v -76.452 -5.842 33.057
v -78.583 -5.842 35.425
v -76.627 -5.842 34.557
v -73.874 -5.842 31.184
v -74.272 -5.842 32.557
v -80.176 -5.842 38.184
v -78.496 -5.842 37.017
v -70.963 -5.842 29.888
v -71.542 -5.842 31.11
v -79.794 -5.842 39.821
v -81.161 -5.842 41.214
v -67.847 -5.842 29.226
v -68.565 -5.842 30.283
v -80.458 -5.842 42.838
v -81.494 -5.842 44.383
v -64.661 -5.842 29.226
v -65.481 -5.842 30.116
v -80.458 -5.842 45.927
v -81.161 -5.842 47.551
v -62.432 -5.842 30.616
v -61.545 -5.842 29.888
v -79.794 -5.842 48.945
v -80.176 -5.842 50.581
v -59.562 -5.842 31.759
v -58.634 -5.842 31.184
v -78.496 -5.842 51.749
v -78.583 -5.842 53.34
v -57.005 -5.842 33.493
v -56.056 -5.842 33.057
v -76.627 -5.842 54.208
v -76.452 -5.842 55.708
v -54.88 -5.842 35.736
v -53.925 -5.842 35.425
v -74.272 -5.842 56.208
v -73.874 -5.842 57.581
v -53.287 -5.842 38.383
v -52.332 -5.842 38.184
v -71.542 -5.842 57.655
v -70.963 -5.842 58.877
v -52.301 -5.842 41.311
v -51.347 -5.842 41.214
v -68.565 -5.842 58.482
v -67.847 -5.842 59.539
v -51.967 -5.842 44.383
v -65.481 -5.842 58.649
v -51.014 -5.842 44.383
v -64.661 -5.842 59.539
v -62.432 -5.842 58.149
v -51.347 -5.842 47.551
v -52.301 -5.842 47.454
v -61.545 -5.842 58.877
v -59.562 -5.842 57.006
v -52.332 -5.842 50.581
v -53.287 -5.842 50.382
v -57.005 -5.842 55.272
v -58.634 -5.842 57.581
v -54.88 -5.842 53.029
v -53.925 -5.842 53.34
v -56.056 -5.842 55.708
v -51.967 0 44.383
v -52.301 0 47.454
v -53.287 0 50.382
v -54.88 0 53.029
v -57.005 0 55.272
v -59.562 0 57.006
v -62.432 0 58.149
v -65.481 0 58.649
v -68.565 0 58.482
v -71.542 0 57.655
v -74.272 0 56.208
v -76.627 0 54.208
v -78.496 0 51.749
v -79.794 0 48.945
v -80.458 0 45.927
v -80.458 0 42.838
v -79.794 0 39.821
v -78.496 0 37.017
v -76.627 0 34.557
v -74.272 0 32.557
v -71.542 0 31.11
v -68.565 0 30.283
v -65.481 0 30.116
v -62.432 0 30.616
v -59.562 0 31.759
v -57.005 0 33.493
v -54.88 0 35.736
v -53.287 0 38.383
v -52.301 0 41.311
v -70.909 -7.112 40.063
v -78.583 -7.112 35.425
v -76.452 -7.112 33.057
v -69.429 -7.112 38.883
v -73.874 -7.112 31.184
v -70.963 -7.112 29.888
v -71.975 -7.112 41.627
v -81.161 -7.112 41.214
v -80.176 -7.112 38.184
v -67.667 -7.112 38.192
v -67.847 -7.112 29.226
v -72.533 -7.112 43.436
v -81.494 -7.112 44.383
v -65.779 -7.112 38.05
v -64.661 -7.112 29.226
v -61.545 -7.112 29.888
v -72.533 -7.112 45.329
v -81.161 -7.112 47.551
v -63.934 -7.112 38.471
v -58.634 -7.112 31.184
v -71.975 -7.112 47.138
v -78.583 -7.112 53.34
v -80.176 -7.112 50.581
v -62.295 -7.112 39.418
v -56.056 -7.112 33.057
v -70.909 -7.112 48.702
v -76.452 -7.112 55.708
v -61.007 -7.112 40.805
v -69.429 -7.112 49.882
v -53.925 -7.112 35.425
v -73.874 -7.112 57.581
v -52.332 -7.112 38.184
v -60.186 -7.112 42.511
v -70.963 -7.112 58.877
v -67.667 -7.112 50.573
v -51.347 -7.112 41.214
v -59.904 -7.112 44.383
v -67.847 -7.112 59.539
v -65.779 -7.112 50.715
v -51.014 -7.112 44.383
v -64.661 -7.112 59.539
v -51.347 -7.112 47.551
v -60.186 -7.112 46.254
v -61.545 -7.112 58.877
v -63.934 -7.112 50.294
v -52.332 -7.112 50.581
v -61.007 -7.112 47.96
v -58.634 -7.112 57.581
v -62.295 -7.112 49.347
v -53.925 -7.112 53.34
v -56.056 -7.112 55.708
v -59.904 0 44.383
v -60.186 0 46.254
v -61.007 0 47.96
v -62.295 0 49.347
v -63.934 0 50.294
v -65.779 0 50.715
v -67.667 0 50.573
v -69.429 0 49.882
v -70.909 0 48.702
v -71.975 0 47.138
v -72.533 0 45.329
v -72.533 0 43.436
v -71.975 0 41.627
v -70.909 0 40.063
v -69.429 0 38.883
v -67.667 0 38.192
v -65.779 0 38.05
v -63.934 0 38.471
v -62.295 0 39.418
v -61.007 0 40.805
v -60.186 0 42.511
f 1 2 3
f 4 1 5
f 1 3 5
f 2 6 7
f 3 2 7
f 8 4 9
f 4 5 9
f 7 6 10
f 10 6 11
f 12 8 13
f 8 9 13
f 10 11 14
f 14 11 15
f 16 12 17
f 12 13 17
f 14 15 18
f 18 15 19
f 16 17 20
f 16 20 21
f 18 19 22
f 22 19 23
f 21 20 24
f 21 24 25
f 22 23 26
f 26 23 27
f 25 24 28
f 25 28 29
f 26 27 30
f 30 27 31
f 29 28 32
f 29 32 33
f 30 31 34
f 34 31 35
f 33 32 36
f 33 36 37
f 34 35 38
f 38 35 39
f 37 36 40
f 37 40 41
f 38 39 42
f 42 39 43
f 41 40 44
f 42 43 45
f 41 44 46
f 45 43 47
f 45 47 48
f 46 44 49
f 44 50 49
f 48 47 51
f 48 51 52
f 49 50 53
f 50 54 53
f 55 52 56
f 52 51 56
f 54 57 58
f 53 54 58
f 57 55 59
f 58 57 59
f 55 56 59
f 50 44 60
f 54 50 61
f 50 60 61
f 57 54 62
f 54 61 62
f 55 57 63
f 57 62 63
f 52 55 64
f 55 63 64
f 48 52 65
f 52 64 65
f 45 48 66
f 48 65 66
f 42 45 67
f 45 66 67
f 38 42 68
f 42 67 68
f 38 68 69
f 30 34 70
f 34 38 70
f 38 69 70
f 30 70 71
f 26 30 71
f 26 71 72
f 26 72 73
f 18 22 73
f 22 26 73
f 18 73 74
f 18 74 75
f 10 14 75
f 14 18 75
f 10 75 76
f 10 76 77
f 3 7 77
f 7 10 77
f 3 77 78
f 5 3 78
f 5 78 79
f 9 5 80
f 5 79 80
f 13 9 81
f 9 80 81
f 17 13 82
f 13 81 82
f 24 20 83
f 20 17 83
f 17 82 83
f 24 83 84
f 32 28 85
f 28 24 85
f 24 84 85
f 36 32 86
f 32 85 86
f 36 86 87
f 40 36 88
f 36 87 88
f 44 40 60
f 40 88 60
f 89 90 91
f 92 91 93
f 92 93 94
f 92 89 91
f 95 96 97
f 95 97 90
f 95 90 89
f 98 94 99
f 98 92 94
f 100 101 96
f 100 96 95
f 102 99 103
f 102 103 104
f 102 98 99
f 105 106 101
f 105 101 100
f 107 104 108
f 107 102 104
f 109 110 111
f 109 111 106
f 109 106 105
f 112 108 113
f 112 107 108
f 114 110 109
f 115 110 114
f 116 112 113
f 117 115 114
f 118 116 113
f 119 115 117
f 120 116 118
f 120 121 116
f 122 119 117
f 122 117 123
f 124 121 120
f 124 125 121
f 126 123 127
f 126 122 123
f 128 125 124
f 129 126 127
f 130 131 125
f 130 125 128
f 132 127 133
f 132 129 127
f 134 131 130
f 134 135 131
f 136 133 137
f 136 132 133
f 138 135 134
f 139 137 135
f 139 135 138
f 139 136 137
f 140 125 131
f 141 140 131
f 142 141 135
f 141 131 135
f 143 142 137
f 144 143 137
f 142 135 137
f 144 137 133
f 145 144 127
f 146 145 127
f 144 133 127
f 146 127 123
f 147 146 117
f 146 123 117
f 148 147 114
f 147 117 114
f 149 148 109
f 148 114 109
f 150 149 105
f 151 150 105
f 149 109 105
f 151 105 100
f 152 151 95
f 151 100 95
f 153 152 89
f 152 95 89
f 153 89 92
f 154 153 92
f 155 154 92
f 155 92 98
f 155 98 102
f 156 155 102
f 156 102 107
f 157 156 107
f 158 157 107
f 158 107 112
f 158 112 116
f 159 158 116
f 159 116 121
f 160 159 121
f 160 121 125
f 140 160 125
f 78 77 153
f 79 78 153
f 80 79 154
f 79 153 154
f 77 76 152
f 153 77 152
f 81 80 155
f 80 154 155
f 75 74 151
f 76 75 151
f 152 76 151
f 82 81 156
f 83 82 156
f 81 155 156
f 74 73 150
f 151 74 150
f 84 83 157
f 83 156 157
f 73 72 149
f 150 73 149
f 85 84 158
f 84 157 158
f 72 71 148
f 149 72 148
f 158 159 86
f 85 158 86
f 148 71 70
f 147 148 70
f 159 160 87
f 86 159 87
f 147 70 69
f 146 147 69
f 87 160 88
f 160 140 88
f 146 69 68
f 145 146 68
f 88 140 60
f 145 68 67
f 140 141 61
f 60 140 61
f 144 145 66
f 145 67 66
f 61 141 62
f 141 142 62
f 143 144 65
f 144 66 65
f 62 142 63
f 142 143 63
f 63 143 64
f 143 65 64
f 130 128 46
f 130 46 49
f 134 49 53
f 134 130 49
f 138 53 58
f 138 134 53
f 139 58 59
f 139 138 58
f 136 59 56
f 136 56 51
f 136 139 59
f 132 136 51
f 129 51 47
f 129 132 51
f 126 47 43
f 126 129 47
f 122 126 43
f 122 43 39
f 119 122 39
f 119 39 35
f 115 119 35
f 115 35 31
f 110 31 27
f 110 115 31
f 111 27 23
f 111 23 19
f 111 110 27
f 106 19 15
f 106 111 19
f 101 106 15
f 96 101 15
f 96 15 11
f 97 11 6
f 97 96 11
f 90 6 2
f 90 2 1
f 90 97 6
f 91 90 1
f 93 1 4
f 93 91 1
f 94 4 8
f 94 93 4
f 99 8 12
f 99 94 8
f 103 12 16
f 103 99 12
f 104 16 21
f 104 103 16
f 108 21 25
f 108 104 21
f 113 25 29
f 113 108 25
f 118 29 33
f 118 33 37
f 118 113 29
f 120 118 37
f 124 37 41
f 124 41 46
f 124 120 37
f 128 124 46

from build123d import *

# Parameters (mm, degrees)
F0_R     = 14.2875
F0_R_2   = 6.35
F1_DEPTH = 7.112
F2_R     = 15.24
F3_DEPTH = 1.27
F4_R     = 6.35
F5_DEPTH = 25.4


with BuildPart() as f1:
    # F0 (on Front) → F1 (new body)
    with BuildSketch(Plane.XZ):
        with Locations((-66.254035, 44.382535)):
            Circle(F0_R)
        with Locations((-66.254035, 44.382535)):
            Circle(F0_R_2, mode=Mode.SUBTRACT)
    extrude(amount=F1_DEPTH)

    # F2 (on face) → F3 (join)
    with BuildSketch(Plane.XZ.offset(7.112)):
        with Locations((-66.254035, 44.382535)):
            Circle(F2_R)
    extrude(amount=-F3_DEPTH)

    # F4 (on face) → F5 (cut)
    with BuildSketch(Plane.XZ.offset(7.112)):
        with Locations((-66.254035, 44.382535)):
            Circle(F4_R)
    extrude(amount=-F5_DEPTH, mode=Mode.SUBTRACT)


solid = f1.part
